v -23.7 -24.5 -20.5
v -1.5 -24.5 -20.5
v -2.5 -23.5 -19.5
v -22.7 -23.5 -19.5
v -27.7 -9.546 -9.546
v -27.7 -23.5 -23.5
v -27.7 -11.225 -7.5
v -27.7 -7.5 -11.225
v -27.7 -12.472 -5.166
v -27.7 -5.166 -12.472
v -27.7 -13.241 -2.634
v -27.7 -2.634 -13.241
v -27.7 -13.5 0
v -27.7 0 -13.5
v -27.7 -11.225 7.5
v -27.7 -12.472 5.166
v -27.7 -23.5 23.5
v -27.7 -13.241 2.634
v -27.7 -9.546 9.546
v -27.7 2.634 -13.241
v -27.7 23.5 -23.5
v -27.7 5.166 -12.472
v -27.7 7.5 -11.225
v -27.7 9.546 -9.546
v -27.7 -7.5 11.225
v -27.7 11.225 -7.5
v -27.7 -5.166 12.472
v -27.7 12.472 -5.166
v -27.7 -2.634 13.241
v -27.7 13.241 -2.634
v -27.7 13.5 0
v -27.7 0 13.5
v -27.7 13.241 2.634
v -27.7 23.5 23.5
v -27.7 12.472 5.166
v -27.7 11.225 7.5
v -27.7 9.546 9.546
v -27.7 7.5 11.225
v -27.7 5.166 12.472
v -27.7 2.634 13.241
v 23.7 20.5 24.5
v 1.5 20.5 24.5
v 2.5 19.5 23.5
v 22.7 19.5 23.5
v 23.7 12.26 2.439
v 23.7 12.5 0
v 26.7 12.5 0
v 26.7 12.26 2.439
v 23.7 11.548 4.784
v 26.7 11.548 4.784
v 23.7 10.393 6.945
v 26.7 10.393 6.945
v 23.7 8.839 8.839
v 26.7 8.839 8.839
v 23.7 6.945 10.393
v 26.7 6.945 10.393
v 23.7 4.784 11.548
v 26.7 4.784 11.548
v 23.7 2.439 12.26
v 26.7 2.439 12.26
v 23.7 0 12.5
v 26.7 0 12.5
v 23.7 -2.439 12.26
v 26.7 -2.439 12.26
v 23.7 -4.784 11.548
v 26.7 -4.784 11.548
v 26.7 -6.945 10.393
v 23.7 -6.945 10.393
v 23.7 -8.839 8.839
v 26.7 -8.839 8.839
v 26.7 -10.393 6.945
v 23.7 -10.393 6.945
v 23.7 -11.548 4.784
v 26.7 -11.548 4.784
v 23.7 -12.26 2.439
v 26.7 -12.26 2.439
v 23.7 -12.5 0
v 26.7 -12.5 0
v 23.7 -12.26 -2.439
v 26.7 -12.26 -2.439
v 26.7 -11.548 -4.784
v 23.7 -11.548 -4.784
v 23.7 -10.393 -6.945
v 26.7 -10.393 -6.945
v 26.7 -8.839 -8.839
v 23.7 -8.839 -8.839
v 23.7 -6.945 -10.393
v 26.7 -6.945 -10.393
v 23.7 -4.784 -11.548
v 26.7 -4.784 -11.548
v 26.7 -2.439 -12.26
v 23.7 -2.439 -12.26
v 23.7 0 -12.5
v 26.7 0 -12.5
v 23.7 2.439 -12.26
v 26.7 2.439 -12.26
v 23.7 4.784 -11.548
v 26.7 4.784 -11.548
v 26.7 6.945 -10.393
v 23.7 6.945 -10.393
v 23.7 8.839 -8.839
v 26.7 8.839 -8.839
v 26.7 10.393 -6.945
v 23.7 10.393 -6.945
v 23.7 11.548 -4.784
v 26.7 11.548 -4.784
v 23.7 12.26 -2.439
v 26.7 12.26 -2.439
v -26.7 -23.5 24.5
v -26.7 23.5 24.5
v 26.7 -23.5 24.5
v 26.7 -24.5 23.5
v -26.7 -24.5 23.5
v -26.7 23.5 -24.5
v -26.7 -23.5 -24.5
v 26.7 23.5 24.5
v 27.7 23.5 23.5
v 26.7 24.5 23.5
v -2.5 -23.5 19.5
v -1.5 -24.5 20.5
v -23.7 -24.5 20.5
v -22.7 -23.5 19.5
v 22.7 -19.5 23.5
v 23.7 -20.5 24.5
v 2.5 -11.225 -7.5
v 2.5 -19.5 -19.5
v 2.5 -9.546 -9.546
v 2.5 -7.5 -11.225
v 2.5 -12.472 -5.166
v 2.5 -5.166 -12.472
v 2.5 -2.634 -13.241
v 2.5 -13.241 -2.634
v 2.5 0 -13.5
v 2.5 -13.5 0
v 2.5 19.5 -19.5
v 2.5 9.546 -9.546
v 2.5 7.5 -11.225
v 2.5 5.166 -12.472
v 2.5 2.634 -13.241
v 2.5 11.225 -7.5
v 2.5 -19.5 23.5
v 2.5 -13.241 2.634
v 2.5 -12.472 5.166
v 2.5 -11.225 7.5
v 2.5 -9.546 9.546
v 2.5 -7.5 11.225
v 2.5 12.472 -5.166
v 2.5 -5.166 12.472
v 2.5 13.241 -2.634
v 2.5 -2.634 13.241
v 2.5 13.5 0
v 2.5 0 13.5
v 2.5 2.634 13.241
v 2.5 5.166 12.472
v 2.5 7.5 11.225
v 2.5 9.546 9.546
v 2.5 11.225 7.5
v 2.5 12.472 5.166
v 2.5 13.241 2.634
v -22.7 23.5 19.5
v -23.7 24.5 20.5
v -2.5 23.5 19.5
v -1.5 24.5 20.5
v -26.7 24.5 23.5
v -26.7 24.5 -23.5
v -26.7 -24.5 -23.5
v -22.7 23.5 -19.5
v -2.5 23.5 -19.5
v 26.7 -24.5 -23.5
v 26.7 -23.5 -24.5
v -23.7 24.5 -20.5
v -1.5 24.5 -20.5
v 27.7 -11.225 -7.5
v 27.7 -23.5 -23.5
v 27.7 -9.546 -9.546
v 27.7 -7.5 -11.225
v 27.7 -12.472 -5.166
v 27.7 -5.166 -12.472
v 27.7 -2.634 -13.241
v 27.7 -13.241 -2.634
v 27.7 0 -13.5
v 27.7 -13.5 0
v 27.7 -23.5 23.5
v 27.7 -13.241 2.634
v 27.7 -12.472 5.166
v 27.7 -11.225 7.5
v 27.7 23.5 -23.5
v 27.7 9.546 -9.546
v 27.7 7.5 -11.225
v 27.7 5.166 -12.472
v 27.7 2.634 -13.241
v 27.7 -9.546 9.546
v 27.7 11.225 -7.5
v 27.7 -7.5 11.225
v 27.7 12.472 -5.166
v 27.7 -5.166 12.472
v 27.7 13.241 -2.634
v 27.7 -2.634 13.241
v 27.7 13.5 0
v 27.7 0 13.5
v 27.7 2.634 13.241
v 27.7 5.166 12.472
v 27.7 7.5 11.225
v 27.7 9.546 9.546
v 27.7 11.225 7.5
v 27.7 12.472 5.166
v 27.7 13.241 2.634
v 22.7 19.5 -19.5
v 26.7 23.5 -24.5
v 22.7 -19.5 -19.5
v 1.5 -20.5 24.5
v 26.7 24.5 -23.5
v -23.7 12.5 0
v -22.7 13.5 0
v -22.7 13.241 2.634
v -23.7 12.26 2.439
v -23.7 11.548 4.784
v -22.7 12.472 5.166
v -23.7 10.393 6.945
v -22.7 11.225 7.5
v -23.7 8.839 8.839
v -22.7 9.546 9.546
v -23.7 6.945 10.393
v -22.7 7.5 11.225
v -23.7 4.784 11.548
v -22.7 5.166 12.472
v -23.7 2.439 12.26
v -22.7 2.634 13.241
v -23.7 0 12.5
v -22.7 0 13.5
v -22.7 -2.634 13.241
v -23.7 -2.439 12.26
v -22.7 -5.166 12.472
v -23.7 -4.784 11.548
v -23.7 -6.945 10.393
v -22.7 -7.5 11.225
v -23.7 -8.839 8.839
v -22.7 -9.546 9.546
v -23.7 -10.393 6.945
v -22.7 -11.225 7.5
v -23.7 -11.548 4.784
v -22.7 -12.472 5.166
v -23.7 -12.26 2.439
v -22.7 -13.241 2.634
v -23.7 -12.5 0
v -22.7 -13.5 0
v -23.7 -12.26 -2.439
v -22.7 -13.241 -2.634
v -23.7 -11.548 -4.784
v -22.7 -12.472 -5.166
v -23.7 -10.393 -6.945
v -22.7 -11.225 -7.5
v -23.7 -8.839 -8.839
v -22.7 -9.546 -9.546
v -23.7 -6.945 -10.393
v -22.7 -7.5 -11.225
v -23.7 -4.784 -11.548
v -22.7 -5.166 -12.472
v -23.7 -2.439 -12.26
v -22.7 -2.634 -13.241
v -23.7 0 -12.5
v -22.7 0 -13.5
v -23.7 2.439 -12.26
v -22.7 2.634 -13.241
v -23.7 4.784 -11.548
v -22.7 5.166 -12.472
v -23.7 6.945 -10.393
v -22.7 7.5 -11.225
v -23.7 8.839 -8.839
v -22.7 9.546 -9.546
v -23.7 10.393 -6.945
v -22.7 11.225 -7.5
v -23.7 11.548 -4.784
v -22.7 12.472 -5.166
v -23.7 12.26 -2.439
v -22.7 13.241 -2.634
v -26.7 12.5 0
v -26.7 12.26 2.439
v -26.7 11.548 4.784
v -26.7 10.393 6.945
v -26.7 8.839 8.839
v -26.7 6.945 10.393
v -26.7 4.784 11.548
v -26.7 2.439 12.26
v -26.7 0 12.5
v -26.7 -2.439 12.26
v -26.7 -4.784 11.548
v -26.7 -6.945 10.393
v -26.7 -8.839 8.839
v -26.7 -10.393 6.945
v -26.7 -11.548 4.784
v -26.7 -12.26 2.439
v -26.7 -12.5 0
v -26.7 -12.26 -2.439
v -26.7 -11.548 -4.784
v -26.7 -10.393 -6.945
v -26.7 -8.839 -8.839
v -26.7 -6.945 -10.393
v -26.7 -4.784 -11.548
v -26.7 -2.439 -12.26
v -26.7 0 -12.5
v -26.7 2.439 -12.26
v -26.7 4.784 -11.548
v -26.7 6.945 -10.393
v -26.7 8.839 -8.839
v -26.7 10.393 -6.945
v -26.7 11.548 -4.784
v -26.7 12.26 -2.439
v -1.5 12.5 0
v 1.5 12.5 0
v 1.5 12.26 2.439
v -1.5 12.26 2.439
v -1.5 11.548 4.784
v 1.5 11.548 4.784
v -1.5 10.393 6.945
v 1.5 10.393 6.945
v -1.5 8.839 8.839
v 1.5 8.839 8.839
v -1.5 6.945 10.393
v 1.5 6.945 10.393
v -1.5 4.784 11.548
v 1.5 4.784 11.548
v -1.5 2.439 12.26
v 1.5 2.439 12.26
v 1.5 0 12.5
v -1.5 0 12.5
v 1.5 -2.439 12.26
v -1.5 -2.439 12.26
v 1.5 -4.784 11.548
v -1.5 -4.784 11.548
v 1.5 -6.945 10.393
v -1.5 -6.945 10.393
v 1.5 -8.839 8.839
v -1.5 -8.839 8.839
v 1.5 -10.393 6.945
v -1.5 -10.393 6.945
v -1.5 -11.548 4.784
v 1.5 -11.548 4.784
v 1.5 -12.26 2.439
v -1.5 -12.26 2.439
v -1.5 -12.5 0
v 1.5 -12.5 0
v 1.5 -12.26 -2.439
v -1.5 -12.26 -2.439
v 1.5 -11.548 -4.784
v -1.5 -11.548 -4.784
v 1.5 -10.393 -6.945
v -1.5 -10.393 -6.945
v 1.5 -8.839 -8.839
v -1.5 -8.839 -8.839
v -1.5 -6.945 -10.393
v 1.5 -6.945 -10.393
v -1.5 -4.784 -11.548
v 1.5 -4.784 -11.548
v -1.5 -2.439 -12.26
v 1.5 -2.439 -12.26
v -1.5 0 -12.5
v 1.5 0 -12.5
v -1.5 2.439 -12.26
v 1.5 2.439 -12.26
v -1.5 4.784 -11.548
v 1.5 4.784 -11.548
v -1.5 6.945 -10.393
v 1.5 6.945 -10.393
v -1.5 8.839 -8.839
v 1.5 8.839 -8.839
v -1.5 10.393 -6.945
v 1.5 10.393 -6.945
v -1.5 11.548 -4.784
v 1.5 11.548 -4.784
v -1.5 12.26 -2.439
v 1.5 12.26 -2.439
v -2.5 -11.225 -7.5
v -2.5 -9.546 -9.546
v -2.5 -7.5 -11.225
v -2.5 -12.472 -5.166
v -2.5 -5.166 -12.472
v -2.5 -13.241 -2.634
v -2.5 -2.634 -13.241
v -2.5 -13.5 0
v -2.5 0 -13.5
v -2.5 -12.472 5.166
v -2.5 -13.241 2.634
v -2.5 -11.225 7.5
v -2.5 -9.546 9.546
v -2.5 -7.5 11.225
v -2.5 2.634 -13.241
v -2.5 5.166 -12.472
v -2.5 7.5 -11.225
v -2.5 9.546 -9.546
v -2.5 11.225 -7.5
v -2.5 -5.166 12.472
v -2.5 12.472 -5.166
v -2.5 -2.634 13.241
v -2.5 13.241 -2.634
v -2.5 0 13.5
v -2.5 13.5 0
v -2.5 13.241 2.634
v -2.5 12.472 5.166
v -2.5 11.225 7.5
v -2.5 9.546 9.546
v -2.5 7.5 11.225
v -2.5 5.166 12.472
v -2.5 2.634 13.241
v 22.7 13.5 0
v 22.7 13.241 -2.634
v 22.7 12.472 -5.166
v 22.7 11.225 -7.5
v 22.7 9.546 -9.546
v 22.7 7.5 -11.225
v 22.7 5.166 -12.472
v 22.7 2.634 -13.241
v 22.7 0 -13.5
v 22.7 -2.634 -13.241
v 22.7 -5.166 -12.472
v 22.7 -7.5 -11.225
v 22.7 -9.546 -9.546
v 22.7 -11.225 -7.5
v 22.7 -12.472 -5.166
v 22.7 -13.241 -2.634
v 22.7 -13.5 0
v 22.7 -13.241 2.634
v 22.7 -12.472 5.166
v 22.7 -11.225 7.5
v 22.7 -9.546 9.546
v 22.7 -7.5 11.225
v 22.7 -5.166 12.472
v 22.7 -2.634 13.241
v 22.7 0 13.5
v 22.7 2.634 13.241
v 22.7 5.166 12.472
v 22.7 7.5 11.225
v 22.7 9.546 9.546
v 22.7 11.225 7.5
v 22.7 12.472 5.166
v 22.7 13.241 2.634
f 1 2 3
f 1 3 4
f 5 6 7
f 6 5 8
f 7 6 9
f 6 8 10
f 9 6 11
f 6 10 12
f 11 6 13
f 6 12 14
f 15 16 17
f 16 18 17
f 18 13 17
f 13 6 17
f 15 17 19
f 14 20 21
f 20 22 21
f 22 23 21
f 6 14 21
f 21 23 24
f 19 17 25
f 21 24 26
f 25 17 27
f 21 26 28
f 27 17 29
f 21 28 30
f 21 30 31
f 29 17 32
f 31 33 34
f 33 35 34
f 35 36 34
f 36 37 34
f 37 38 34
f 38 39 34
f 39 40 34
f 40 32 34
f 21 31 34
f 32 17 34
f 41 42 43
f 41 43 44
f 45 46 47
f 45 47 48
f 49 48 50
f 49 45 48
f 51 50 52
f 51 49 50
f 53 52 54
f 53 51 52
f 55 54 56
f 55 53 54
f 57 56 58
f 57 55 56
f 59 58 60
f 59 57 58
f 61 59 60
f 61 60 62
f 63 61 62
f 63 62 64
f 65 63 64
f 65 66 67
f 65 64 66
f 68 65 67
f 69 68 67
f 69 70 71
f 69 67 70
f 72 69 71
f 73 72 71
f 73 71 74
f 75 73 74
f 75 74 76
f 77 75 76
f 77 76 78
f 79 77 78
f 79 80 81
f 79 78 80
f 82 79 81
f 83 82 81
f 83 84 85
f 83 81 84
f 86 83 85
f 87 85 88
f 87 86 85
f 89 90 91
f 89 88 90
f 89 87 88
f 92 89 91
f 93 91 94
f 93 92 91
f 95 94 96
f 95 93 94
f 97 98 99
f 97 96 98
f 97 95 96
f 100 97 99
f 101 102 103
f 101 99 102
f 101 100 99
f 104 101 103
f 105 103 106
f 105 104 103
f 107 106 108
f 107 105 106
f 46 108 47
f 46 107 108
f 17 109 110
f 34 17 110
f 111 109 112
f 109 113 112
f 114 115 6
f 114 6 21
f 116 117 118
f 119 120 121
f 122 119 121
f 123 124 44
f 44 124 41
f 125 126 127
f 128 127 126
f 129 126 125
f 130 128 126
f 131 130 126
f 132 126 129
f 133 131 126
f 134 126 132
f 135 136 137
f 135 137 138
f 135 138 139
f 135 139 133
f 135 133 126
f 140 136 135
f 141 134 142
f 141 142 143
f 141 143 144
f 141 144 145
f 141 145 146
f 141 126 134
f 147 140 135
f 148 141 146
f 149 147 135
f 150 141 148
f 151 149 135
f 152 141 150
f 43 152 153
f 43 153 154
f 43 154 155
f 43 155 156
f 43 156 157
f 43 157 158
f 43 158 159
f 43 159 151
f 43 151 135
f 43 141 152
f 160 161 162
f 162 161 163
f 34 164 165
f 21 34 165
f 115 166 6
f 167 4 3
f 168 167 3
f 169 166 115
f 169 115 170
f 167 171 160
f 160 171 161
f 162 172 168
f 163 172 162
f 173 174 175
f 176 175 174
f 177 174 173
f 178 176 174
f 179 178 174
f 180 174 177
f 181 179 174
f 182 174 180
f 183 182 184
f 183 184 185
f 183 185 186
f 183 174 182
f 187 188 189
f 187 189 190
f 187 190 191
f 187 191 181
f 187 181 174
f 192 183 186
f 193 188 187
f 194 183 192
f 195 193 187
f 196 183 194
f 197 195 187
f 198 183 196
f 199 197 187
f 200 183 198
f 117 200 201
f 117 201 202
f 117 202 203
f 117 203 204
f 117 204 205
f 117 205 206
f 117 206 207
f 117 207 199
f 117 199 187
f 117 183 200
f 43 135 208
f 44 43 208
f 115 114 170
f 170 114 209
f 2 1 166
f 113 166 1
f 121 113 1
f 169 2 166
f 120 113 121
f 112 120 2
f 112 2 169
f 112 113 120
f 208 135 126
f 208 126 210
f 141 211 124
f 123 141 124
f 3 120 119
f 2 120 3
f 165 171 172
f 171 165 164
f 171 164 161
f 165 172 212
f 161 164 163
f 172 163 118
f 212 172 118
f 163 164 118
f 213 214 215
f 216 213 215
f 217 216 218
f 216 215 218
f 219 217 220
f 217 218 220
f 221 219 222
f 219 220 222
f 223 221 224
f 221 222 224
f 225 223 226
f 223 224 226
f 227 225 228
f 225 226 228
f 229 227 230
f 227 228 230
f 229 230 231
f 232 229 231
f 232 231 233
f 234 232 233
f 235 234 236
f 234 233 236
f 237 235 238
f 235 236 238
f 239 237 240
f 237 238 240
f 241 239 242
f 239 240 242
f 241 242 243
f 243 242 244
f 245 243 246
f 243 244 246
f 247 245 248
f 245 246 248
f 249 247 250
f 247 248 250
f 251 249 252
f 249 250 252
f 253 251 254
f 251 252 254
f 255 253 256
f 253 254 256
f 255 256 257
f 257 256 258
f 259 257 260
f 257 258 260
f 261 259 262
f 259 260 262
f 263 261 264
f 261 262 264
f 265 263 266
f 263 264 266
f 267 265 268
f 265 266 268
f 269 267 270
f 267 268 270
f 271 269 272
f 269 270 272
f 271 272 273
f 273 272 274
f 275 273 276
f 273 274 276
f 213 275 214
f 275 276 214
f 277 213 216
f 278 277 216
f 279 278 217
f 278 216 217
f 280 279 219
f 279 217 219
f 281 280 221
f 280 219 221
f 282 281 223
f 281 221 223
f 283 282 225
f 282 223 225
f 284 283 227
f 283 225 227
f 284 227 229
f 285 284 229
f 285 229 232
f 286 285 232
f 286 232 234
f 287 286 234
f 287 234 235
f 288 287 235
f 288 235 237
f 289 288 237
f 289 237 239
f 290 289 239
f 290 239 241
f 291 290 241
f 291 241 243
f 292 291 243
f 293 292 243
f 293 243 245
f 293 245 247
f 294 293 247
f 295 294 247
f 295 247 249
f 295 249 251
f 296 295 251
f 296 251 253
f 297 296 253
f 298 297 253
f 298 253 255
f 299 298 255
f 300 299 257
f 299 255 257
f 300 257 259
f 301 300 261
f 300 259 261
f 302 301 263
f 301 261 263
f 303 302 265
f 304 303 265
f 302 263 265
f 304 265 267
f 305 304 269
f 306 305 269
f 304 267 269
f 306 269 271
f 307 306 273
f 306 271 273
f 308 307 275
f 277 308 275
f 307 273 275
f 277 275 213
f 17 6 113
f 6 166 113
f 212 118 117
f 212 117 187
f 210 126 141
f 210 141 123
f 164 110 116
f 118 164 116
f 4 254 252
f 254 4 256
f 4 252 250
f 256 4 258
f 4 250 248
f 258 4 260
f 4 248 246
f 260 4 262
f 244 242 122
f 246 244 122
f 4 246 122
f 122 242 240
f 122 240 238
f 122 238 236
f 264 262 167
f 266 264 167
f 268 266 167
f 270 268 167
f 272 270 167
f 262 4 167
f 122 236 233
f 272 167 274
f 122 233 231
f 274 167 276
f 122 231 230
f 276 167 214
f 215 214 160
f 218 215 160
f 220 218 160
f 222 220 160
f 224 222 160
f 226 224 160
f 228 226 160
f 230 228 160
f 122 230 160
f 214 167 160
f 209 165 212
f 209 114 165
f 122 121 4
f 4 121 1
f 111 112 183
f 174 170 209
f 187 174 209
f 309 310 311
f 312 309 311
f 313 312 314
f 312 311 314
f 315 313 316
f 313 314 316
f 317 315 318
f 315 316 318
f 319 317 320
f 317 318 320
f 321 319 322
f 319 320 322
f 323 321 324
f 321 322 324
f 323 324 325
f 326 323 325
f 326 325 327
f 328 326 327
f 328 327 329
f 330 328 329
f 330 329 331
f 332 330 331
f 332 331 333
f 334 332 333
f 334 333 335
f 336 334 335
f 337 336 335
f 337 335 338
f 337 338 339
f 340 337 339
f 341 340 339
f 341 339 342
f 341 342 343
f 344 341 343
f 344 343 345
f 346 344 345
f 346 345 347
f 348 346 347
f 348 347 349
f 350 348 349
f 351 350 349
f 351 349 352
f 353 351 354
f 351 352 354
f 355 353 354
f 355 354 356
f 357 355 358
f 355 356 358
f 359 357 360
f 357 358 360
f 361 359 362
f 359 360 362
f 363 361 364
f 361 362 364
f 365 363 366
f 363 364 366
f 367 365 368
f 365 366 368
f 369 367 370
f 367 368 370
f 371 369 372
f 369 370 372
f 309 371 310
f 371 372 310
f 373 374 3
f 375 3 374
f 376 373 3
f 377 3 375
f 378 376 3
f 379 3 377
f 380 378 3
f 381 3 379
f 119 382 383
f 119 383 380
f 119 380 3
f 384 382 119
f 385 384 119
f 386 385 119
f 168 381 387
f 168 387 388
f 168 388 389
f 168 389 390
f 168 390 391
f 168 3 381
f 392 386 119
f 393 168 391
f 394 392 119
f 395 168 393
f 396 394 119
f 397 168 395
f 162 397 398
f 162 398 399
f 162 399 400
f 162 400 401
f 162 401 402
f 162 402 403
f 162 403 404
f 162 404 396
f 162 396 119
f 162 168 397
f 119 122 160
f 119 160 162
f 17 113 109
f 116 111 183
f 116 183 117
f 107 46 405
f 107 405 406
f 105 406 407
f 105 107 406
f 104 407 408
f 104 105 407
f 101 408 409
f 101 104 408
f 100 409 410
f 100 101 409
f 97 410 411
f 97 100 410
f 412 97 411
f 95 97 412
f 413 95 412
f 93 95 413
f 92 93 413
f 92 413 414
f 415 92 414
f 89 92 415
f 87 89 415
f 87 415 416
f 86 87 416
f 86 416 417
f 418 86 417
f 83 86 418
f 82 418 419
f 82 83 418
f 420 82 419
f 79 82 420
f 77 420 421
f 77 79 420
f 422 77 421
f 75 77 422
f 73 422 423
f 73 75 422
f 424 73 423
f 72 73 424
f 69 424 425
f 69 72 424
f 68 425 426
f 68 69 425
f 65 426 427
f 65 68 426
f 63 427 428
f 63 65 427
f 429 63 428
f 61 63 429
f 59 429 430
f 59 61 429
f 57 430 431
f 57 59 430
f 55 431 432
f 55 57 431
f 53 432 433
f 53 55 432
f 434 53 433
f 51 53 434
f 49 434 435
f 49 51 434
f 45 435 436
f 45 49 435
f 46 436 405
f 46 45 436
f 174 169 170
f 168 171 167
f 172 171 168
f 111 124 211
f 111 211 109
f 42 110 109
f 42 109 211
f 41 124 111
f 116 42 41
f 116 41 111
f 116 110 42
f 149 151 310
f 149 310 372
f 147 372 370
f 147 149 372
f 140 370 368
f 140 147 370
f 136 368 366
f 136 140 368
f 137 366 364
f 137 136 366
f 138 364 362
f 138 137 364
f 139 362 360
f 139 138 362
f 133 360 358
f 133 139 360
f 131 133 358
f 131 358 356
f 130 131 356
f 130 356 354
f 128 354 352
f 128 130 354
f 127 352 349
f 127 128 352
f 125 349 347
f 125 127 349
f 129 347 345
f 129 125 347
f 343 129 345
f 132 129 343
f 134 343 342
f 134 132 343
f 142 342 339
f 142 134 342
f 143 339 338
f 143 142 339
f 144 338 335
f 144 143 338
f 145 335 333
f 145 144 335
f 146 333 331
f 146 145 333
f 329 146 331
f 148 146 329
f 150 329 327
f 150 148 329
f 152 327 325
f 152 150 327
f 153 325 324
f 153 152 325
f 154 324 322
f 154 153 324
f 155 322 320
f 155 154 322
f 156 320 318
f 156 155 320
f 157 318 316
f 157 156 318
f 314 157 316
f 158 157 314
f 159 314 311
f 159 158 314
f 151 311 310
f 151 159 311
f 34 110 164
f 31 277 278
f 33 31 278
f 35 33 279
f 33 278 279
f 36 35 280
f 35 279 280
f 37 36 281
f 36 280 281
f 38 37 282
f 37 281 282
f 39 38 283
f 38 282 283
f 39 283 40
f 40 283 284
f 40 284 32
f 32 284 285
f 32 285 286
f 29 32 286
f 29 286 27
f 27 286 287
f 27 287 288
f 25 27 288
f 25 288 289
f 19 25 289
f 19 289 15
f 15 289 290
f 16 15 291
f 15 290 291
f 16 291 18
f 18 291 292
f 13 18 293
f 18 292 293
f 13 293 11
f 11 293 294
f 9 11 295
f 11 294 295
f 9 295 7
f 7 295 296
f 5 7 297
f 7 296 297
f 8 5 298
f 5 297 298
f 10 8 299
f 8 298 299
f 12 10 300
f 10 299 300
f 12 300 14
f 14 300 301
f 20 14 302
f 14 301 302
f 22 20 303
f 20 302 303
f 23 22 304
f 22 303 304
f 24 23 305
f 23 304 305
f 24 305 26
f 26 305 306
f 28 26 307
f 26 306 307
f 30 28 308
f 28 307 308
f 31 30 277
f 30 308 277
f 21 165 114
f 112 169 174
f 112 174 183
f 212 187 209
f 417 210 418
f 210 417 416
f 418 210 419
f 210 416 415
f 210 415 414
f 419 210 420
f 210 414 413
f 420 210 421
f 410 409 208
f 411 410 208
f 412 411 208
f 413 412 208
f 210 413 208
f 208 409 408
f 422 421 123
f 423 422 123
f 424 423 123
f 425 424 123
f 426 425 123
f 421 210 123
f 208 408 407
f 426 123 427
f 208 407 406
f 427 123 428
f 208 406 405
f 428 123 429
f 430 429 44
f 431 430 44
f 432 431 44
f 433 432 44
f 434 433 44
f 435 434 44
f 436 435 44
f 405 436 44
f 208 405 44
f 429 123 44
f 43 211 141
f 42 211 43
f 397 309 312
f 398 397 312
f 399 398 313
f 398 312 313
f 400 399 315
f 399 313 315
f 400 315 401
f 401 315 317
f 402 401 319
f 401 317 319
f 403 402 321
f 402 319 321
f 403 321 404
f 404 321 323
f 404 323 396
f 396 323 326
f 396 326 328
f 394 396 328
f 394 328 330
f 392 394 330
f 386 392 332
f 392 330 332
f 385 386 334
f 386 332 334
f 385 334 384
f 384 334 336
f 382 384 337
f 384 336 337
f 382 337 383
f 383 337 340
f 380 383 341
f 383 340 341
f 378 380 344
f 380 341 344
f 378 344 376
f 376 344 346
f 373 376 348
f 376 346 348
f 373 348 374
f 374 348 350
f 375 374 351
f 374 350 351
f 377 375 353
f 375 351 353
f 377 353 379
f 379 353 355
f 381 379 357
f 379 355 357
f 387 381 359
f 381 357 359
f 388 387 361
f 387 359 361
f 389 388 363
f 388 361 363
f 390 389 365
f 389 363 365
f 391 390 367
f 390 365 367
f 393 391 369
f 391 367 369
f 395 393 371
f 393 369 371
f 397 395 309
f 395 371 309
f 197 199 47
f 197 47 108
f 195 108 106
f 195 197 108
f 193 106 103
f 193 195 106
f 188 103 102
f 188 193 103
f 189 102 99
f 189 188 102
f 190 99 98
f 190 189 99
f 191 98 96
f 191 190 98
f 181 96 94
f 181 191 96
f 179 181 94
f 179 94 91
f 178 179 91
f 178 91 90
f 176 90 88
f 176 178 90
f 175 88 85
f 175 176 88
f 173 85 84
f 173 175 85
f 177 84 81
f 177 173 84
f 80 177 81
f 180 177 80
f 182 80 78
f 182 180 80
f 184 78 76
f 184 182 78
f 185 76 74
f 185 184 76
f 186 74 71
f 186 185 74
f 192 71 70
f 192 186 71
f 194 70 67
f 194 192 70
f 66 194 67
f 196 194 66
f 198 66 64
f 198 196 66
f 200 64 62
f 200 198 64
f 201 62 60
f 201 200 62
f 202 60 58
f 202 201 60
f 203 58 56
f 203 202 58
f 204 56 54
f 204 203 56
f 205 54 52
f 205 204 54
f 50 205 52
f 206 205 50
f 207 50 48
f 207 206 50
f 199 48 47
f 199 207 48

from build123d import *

# Parameters (mm, degrees)
SKETCH_W             = 55.4
SKETCH_H             = 49
PAD_DEPTH            = 24.5
SKETCH001_W          = 20.2
SKETCH001_H          = 39
POCKET_DEPTH         = 49
SKETCH002_W          = 20.2
SKETCH002_H          = 39
POCKET001_DEPTH      = 24.501
POCKET001_DEPTH_BACK = 24.501
SKETCH003_R          = 12.5
POCKET002_DEPTH      = 27.701
POCKET002_DEPTH_BACK = 27.701
CHAMFER_SIZE         = 1


with BuildPart() as part:
    # Sketch → Pad (new body, symmetric)
    with BuildSketch(Plane.XY):
        Rectangle(SKETCH_W, SKETCH_H)
    extrude(amount=PAD_DEPTH, both=True)

    # Sketch001 → Pocket (cut)
    with BuildSketch(Plane.XY.offset(29.5)):
        with Locations((12.6, 0)):
            Rectangle(SKETCH001_W, SKETCH001_H)
    extrude(amount=-POCKET_DEPTH, mode=Mode.SUBTRACT)

    # Sketch002 → Pocket001 (cut, two sides)
    with BuildSketch(Plane.XZ) as pocket001_sk:
        with Locations((-12.6, 0)):
            Rectangle(SKETCH002_W, SKETCH002_H)
    extrude(amount=-POCKET001_DEPTH, mode=Mode.SUBTRACT)
    extrude(pocket001_sk.sketch, amount=POCKET001_DEPTH_BACK, mode=Mode.SUBTRACT)

    # Sketch003 → Pocket002 (cut, two sides)
    with BuildSketch(Plane.YZ) as pocket002_sk:
        Circle(SKETCH003_R)
    extrude(amount=-POCKET002_DEPTH, mode=Mode.SUBTRACT)
    extrude(pocket002_sk.sketch, amount=POCKET002_DEPTH_BACK, mode=Mode.SUBTRACT)

    # Chamfer
    chamfer_edges = [part.edges().sort_by_distance(p)[0] for p in [
        (0, -24.5, 24.5),
        (-27.7, -24.5, 0),
        (0, -24.5, -24.5),
        (-12.6, -24.5, -19.5),
        (-22.7, -24.5, 0),
        (-12.6, -24.5, 19.5),
        (-2.5, -24.5, 0),
        (27.7, -24.5, 0),
        (27.7, 0, 24.5),
        (27.7, -12.5, 0),
        (27.7, 0, -24.5),
        (27.7, 24.5, 0),
        (22.7, 0, 24.5),
        (12.6, -19.5, 24.5),
        (2.5, 0, 24.5),
        (12.6, 19.5, 24.5),
        (-27.7, 0, 24.5),
        (0, 24.5, 24.5),
        (2.5, -12.5, 0),
        (22.7, -12.5, 0),
        (0, 24.5, -24.5),
        (-2.5, 24.5, 0),
        (-12.6, 24.5, -19.5),
        (-22.7, 24.5, 0),
        (-12.6, 24.5, 19.5),
        (-27.7, 24.5, 0),
        (-27.7, 0, -24.5),
        (-27.7, -12.5, 0),
        (-22.7, -12.5, 0),
        (-2.5, -12.5, 0),
    ]]
    chamfer(chamfer_edges, length=CHAMFER_SIZE)


solid = part.part
